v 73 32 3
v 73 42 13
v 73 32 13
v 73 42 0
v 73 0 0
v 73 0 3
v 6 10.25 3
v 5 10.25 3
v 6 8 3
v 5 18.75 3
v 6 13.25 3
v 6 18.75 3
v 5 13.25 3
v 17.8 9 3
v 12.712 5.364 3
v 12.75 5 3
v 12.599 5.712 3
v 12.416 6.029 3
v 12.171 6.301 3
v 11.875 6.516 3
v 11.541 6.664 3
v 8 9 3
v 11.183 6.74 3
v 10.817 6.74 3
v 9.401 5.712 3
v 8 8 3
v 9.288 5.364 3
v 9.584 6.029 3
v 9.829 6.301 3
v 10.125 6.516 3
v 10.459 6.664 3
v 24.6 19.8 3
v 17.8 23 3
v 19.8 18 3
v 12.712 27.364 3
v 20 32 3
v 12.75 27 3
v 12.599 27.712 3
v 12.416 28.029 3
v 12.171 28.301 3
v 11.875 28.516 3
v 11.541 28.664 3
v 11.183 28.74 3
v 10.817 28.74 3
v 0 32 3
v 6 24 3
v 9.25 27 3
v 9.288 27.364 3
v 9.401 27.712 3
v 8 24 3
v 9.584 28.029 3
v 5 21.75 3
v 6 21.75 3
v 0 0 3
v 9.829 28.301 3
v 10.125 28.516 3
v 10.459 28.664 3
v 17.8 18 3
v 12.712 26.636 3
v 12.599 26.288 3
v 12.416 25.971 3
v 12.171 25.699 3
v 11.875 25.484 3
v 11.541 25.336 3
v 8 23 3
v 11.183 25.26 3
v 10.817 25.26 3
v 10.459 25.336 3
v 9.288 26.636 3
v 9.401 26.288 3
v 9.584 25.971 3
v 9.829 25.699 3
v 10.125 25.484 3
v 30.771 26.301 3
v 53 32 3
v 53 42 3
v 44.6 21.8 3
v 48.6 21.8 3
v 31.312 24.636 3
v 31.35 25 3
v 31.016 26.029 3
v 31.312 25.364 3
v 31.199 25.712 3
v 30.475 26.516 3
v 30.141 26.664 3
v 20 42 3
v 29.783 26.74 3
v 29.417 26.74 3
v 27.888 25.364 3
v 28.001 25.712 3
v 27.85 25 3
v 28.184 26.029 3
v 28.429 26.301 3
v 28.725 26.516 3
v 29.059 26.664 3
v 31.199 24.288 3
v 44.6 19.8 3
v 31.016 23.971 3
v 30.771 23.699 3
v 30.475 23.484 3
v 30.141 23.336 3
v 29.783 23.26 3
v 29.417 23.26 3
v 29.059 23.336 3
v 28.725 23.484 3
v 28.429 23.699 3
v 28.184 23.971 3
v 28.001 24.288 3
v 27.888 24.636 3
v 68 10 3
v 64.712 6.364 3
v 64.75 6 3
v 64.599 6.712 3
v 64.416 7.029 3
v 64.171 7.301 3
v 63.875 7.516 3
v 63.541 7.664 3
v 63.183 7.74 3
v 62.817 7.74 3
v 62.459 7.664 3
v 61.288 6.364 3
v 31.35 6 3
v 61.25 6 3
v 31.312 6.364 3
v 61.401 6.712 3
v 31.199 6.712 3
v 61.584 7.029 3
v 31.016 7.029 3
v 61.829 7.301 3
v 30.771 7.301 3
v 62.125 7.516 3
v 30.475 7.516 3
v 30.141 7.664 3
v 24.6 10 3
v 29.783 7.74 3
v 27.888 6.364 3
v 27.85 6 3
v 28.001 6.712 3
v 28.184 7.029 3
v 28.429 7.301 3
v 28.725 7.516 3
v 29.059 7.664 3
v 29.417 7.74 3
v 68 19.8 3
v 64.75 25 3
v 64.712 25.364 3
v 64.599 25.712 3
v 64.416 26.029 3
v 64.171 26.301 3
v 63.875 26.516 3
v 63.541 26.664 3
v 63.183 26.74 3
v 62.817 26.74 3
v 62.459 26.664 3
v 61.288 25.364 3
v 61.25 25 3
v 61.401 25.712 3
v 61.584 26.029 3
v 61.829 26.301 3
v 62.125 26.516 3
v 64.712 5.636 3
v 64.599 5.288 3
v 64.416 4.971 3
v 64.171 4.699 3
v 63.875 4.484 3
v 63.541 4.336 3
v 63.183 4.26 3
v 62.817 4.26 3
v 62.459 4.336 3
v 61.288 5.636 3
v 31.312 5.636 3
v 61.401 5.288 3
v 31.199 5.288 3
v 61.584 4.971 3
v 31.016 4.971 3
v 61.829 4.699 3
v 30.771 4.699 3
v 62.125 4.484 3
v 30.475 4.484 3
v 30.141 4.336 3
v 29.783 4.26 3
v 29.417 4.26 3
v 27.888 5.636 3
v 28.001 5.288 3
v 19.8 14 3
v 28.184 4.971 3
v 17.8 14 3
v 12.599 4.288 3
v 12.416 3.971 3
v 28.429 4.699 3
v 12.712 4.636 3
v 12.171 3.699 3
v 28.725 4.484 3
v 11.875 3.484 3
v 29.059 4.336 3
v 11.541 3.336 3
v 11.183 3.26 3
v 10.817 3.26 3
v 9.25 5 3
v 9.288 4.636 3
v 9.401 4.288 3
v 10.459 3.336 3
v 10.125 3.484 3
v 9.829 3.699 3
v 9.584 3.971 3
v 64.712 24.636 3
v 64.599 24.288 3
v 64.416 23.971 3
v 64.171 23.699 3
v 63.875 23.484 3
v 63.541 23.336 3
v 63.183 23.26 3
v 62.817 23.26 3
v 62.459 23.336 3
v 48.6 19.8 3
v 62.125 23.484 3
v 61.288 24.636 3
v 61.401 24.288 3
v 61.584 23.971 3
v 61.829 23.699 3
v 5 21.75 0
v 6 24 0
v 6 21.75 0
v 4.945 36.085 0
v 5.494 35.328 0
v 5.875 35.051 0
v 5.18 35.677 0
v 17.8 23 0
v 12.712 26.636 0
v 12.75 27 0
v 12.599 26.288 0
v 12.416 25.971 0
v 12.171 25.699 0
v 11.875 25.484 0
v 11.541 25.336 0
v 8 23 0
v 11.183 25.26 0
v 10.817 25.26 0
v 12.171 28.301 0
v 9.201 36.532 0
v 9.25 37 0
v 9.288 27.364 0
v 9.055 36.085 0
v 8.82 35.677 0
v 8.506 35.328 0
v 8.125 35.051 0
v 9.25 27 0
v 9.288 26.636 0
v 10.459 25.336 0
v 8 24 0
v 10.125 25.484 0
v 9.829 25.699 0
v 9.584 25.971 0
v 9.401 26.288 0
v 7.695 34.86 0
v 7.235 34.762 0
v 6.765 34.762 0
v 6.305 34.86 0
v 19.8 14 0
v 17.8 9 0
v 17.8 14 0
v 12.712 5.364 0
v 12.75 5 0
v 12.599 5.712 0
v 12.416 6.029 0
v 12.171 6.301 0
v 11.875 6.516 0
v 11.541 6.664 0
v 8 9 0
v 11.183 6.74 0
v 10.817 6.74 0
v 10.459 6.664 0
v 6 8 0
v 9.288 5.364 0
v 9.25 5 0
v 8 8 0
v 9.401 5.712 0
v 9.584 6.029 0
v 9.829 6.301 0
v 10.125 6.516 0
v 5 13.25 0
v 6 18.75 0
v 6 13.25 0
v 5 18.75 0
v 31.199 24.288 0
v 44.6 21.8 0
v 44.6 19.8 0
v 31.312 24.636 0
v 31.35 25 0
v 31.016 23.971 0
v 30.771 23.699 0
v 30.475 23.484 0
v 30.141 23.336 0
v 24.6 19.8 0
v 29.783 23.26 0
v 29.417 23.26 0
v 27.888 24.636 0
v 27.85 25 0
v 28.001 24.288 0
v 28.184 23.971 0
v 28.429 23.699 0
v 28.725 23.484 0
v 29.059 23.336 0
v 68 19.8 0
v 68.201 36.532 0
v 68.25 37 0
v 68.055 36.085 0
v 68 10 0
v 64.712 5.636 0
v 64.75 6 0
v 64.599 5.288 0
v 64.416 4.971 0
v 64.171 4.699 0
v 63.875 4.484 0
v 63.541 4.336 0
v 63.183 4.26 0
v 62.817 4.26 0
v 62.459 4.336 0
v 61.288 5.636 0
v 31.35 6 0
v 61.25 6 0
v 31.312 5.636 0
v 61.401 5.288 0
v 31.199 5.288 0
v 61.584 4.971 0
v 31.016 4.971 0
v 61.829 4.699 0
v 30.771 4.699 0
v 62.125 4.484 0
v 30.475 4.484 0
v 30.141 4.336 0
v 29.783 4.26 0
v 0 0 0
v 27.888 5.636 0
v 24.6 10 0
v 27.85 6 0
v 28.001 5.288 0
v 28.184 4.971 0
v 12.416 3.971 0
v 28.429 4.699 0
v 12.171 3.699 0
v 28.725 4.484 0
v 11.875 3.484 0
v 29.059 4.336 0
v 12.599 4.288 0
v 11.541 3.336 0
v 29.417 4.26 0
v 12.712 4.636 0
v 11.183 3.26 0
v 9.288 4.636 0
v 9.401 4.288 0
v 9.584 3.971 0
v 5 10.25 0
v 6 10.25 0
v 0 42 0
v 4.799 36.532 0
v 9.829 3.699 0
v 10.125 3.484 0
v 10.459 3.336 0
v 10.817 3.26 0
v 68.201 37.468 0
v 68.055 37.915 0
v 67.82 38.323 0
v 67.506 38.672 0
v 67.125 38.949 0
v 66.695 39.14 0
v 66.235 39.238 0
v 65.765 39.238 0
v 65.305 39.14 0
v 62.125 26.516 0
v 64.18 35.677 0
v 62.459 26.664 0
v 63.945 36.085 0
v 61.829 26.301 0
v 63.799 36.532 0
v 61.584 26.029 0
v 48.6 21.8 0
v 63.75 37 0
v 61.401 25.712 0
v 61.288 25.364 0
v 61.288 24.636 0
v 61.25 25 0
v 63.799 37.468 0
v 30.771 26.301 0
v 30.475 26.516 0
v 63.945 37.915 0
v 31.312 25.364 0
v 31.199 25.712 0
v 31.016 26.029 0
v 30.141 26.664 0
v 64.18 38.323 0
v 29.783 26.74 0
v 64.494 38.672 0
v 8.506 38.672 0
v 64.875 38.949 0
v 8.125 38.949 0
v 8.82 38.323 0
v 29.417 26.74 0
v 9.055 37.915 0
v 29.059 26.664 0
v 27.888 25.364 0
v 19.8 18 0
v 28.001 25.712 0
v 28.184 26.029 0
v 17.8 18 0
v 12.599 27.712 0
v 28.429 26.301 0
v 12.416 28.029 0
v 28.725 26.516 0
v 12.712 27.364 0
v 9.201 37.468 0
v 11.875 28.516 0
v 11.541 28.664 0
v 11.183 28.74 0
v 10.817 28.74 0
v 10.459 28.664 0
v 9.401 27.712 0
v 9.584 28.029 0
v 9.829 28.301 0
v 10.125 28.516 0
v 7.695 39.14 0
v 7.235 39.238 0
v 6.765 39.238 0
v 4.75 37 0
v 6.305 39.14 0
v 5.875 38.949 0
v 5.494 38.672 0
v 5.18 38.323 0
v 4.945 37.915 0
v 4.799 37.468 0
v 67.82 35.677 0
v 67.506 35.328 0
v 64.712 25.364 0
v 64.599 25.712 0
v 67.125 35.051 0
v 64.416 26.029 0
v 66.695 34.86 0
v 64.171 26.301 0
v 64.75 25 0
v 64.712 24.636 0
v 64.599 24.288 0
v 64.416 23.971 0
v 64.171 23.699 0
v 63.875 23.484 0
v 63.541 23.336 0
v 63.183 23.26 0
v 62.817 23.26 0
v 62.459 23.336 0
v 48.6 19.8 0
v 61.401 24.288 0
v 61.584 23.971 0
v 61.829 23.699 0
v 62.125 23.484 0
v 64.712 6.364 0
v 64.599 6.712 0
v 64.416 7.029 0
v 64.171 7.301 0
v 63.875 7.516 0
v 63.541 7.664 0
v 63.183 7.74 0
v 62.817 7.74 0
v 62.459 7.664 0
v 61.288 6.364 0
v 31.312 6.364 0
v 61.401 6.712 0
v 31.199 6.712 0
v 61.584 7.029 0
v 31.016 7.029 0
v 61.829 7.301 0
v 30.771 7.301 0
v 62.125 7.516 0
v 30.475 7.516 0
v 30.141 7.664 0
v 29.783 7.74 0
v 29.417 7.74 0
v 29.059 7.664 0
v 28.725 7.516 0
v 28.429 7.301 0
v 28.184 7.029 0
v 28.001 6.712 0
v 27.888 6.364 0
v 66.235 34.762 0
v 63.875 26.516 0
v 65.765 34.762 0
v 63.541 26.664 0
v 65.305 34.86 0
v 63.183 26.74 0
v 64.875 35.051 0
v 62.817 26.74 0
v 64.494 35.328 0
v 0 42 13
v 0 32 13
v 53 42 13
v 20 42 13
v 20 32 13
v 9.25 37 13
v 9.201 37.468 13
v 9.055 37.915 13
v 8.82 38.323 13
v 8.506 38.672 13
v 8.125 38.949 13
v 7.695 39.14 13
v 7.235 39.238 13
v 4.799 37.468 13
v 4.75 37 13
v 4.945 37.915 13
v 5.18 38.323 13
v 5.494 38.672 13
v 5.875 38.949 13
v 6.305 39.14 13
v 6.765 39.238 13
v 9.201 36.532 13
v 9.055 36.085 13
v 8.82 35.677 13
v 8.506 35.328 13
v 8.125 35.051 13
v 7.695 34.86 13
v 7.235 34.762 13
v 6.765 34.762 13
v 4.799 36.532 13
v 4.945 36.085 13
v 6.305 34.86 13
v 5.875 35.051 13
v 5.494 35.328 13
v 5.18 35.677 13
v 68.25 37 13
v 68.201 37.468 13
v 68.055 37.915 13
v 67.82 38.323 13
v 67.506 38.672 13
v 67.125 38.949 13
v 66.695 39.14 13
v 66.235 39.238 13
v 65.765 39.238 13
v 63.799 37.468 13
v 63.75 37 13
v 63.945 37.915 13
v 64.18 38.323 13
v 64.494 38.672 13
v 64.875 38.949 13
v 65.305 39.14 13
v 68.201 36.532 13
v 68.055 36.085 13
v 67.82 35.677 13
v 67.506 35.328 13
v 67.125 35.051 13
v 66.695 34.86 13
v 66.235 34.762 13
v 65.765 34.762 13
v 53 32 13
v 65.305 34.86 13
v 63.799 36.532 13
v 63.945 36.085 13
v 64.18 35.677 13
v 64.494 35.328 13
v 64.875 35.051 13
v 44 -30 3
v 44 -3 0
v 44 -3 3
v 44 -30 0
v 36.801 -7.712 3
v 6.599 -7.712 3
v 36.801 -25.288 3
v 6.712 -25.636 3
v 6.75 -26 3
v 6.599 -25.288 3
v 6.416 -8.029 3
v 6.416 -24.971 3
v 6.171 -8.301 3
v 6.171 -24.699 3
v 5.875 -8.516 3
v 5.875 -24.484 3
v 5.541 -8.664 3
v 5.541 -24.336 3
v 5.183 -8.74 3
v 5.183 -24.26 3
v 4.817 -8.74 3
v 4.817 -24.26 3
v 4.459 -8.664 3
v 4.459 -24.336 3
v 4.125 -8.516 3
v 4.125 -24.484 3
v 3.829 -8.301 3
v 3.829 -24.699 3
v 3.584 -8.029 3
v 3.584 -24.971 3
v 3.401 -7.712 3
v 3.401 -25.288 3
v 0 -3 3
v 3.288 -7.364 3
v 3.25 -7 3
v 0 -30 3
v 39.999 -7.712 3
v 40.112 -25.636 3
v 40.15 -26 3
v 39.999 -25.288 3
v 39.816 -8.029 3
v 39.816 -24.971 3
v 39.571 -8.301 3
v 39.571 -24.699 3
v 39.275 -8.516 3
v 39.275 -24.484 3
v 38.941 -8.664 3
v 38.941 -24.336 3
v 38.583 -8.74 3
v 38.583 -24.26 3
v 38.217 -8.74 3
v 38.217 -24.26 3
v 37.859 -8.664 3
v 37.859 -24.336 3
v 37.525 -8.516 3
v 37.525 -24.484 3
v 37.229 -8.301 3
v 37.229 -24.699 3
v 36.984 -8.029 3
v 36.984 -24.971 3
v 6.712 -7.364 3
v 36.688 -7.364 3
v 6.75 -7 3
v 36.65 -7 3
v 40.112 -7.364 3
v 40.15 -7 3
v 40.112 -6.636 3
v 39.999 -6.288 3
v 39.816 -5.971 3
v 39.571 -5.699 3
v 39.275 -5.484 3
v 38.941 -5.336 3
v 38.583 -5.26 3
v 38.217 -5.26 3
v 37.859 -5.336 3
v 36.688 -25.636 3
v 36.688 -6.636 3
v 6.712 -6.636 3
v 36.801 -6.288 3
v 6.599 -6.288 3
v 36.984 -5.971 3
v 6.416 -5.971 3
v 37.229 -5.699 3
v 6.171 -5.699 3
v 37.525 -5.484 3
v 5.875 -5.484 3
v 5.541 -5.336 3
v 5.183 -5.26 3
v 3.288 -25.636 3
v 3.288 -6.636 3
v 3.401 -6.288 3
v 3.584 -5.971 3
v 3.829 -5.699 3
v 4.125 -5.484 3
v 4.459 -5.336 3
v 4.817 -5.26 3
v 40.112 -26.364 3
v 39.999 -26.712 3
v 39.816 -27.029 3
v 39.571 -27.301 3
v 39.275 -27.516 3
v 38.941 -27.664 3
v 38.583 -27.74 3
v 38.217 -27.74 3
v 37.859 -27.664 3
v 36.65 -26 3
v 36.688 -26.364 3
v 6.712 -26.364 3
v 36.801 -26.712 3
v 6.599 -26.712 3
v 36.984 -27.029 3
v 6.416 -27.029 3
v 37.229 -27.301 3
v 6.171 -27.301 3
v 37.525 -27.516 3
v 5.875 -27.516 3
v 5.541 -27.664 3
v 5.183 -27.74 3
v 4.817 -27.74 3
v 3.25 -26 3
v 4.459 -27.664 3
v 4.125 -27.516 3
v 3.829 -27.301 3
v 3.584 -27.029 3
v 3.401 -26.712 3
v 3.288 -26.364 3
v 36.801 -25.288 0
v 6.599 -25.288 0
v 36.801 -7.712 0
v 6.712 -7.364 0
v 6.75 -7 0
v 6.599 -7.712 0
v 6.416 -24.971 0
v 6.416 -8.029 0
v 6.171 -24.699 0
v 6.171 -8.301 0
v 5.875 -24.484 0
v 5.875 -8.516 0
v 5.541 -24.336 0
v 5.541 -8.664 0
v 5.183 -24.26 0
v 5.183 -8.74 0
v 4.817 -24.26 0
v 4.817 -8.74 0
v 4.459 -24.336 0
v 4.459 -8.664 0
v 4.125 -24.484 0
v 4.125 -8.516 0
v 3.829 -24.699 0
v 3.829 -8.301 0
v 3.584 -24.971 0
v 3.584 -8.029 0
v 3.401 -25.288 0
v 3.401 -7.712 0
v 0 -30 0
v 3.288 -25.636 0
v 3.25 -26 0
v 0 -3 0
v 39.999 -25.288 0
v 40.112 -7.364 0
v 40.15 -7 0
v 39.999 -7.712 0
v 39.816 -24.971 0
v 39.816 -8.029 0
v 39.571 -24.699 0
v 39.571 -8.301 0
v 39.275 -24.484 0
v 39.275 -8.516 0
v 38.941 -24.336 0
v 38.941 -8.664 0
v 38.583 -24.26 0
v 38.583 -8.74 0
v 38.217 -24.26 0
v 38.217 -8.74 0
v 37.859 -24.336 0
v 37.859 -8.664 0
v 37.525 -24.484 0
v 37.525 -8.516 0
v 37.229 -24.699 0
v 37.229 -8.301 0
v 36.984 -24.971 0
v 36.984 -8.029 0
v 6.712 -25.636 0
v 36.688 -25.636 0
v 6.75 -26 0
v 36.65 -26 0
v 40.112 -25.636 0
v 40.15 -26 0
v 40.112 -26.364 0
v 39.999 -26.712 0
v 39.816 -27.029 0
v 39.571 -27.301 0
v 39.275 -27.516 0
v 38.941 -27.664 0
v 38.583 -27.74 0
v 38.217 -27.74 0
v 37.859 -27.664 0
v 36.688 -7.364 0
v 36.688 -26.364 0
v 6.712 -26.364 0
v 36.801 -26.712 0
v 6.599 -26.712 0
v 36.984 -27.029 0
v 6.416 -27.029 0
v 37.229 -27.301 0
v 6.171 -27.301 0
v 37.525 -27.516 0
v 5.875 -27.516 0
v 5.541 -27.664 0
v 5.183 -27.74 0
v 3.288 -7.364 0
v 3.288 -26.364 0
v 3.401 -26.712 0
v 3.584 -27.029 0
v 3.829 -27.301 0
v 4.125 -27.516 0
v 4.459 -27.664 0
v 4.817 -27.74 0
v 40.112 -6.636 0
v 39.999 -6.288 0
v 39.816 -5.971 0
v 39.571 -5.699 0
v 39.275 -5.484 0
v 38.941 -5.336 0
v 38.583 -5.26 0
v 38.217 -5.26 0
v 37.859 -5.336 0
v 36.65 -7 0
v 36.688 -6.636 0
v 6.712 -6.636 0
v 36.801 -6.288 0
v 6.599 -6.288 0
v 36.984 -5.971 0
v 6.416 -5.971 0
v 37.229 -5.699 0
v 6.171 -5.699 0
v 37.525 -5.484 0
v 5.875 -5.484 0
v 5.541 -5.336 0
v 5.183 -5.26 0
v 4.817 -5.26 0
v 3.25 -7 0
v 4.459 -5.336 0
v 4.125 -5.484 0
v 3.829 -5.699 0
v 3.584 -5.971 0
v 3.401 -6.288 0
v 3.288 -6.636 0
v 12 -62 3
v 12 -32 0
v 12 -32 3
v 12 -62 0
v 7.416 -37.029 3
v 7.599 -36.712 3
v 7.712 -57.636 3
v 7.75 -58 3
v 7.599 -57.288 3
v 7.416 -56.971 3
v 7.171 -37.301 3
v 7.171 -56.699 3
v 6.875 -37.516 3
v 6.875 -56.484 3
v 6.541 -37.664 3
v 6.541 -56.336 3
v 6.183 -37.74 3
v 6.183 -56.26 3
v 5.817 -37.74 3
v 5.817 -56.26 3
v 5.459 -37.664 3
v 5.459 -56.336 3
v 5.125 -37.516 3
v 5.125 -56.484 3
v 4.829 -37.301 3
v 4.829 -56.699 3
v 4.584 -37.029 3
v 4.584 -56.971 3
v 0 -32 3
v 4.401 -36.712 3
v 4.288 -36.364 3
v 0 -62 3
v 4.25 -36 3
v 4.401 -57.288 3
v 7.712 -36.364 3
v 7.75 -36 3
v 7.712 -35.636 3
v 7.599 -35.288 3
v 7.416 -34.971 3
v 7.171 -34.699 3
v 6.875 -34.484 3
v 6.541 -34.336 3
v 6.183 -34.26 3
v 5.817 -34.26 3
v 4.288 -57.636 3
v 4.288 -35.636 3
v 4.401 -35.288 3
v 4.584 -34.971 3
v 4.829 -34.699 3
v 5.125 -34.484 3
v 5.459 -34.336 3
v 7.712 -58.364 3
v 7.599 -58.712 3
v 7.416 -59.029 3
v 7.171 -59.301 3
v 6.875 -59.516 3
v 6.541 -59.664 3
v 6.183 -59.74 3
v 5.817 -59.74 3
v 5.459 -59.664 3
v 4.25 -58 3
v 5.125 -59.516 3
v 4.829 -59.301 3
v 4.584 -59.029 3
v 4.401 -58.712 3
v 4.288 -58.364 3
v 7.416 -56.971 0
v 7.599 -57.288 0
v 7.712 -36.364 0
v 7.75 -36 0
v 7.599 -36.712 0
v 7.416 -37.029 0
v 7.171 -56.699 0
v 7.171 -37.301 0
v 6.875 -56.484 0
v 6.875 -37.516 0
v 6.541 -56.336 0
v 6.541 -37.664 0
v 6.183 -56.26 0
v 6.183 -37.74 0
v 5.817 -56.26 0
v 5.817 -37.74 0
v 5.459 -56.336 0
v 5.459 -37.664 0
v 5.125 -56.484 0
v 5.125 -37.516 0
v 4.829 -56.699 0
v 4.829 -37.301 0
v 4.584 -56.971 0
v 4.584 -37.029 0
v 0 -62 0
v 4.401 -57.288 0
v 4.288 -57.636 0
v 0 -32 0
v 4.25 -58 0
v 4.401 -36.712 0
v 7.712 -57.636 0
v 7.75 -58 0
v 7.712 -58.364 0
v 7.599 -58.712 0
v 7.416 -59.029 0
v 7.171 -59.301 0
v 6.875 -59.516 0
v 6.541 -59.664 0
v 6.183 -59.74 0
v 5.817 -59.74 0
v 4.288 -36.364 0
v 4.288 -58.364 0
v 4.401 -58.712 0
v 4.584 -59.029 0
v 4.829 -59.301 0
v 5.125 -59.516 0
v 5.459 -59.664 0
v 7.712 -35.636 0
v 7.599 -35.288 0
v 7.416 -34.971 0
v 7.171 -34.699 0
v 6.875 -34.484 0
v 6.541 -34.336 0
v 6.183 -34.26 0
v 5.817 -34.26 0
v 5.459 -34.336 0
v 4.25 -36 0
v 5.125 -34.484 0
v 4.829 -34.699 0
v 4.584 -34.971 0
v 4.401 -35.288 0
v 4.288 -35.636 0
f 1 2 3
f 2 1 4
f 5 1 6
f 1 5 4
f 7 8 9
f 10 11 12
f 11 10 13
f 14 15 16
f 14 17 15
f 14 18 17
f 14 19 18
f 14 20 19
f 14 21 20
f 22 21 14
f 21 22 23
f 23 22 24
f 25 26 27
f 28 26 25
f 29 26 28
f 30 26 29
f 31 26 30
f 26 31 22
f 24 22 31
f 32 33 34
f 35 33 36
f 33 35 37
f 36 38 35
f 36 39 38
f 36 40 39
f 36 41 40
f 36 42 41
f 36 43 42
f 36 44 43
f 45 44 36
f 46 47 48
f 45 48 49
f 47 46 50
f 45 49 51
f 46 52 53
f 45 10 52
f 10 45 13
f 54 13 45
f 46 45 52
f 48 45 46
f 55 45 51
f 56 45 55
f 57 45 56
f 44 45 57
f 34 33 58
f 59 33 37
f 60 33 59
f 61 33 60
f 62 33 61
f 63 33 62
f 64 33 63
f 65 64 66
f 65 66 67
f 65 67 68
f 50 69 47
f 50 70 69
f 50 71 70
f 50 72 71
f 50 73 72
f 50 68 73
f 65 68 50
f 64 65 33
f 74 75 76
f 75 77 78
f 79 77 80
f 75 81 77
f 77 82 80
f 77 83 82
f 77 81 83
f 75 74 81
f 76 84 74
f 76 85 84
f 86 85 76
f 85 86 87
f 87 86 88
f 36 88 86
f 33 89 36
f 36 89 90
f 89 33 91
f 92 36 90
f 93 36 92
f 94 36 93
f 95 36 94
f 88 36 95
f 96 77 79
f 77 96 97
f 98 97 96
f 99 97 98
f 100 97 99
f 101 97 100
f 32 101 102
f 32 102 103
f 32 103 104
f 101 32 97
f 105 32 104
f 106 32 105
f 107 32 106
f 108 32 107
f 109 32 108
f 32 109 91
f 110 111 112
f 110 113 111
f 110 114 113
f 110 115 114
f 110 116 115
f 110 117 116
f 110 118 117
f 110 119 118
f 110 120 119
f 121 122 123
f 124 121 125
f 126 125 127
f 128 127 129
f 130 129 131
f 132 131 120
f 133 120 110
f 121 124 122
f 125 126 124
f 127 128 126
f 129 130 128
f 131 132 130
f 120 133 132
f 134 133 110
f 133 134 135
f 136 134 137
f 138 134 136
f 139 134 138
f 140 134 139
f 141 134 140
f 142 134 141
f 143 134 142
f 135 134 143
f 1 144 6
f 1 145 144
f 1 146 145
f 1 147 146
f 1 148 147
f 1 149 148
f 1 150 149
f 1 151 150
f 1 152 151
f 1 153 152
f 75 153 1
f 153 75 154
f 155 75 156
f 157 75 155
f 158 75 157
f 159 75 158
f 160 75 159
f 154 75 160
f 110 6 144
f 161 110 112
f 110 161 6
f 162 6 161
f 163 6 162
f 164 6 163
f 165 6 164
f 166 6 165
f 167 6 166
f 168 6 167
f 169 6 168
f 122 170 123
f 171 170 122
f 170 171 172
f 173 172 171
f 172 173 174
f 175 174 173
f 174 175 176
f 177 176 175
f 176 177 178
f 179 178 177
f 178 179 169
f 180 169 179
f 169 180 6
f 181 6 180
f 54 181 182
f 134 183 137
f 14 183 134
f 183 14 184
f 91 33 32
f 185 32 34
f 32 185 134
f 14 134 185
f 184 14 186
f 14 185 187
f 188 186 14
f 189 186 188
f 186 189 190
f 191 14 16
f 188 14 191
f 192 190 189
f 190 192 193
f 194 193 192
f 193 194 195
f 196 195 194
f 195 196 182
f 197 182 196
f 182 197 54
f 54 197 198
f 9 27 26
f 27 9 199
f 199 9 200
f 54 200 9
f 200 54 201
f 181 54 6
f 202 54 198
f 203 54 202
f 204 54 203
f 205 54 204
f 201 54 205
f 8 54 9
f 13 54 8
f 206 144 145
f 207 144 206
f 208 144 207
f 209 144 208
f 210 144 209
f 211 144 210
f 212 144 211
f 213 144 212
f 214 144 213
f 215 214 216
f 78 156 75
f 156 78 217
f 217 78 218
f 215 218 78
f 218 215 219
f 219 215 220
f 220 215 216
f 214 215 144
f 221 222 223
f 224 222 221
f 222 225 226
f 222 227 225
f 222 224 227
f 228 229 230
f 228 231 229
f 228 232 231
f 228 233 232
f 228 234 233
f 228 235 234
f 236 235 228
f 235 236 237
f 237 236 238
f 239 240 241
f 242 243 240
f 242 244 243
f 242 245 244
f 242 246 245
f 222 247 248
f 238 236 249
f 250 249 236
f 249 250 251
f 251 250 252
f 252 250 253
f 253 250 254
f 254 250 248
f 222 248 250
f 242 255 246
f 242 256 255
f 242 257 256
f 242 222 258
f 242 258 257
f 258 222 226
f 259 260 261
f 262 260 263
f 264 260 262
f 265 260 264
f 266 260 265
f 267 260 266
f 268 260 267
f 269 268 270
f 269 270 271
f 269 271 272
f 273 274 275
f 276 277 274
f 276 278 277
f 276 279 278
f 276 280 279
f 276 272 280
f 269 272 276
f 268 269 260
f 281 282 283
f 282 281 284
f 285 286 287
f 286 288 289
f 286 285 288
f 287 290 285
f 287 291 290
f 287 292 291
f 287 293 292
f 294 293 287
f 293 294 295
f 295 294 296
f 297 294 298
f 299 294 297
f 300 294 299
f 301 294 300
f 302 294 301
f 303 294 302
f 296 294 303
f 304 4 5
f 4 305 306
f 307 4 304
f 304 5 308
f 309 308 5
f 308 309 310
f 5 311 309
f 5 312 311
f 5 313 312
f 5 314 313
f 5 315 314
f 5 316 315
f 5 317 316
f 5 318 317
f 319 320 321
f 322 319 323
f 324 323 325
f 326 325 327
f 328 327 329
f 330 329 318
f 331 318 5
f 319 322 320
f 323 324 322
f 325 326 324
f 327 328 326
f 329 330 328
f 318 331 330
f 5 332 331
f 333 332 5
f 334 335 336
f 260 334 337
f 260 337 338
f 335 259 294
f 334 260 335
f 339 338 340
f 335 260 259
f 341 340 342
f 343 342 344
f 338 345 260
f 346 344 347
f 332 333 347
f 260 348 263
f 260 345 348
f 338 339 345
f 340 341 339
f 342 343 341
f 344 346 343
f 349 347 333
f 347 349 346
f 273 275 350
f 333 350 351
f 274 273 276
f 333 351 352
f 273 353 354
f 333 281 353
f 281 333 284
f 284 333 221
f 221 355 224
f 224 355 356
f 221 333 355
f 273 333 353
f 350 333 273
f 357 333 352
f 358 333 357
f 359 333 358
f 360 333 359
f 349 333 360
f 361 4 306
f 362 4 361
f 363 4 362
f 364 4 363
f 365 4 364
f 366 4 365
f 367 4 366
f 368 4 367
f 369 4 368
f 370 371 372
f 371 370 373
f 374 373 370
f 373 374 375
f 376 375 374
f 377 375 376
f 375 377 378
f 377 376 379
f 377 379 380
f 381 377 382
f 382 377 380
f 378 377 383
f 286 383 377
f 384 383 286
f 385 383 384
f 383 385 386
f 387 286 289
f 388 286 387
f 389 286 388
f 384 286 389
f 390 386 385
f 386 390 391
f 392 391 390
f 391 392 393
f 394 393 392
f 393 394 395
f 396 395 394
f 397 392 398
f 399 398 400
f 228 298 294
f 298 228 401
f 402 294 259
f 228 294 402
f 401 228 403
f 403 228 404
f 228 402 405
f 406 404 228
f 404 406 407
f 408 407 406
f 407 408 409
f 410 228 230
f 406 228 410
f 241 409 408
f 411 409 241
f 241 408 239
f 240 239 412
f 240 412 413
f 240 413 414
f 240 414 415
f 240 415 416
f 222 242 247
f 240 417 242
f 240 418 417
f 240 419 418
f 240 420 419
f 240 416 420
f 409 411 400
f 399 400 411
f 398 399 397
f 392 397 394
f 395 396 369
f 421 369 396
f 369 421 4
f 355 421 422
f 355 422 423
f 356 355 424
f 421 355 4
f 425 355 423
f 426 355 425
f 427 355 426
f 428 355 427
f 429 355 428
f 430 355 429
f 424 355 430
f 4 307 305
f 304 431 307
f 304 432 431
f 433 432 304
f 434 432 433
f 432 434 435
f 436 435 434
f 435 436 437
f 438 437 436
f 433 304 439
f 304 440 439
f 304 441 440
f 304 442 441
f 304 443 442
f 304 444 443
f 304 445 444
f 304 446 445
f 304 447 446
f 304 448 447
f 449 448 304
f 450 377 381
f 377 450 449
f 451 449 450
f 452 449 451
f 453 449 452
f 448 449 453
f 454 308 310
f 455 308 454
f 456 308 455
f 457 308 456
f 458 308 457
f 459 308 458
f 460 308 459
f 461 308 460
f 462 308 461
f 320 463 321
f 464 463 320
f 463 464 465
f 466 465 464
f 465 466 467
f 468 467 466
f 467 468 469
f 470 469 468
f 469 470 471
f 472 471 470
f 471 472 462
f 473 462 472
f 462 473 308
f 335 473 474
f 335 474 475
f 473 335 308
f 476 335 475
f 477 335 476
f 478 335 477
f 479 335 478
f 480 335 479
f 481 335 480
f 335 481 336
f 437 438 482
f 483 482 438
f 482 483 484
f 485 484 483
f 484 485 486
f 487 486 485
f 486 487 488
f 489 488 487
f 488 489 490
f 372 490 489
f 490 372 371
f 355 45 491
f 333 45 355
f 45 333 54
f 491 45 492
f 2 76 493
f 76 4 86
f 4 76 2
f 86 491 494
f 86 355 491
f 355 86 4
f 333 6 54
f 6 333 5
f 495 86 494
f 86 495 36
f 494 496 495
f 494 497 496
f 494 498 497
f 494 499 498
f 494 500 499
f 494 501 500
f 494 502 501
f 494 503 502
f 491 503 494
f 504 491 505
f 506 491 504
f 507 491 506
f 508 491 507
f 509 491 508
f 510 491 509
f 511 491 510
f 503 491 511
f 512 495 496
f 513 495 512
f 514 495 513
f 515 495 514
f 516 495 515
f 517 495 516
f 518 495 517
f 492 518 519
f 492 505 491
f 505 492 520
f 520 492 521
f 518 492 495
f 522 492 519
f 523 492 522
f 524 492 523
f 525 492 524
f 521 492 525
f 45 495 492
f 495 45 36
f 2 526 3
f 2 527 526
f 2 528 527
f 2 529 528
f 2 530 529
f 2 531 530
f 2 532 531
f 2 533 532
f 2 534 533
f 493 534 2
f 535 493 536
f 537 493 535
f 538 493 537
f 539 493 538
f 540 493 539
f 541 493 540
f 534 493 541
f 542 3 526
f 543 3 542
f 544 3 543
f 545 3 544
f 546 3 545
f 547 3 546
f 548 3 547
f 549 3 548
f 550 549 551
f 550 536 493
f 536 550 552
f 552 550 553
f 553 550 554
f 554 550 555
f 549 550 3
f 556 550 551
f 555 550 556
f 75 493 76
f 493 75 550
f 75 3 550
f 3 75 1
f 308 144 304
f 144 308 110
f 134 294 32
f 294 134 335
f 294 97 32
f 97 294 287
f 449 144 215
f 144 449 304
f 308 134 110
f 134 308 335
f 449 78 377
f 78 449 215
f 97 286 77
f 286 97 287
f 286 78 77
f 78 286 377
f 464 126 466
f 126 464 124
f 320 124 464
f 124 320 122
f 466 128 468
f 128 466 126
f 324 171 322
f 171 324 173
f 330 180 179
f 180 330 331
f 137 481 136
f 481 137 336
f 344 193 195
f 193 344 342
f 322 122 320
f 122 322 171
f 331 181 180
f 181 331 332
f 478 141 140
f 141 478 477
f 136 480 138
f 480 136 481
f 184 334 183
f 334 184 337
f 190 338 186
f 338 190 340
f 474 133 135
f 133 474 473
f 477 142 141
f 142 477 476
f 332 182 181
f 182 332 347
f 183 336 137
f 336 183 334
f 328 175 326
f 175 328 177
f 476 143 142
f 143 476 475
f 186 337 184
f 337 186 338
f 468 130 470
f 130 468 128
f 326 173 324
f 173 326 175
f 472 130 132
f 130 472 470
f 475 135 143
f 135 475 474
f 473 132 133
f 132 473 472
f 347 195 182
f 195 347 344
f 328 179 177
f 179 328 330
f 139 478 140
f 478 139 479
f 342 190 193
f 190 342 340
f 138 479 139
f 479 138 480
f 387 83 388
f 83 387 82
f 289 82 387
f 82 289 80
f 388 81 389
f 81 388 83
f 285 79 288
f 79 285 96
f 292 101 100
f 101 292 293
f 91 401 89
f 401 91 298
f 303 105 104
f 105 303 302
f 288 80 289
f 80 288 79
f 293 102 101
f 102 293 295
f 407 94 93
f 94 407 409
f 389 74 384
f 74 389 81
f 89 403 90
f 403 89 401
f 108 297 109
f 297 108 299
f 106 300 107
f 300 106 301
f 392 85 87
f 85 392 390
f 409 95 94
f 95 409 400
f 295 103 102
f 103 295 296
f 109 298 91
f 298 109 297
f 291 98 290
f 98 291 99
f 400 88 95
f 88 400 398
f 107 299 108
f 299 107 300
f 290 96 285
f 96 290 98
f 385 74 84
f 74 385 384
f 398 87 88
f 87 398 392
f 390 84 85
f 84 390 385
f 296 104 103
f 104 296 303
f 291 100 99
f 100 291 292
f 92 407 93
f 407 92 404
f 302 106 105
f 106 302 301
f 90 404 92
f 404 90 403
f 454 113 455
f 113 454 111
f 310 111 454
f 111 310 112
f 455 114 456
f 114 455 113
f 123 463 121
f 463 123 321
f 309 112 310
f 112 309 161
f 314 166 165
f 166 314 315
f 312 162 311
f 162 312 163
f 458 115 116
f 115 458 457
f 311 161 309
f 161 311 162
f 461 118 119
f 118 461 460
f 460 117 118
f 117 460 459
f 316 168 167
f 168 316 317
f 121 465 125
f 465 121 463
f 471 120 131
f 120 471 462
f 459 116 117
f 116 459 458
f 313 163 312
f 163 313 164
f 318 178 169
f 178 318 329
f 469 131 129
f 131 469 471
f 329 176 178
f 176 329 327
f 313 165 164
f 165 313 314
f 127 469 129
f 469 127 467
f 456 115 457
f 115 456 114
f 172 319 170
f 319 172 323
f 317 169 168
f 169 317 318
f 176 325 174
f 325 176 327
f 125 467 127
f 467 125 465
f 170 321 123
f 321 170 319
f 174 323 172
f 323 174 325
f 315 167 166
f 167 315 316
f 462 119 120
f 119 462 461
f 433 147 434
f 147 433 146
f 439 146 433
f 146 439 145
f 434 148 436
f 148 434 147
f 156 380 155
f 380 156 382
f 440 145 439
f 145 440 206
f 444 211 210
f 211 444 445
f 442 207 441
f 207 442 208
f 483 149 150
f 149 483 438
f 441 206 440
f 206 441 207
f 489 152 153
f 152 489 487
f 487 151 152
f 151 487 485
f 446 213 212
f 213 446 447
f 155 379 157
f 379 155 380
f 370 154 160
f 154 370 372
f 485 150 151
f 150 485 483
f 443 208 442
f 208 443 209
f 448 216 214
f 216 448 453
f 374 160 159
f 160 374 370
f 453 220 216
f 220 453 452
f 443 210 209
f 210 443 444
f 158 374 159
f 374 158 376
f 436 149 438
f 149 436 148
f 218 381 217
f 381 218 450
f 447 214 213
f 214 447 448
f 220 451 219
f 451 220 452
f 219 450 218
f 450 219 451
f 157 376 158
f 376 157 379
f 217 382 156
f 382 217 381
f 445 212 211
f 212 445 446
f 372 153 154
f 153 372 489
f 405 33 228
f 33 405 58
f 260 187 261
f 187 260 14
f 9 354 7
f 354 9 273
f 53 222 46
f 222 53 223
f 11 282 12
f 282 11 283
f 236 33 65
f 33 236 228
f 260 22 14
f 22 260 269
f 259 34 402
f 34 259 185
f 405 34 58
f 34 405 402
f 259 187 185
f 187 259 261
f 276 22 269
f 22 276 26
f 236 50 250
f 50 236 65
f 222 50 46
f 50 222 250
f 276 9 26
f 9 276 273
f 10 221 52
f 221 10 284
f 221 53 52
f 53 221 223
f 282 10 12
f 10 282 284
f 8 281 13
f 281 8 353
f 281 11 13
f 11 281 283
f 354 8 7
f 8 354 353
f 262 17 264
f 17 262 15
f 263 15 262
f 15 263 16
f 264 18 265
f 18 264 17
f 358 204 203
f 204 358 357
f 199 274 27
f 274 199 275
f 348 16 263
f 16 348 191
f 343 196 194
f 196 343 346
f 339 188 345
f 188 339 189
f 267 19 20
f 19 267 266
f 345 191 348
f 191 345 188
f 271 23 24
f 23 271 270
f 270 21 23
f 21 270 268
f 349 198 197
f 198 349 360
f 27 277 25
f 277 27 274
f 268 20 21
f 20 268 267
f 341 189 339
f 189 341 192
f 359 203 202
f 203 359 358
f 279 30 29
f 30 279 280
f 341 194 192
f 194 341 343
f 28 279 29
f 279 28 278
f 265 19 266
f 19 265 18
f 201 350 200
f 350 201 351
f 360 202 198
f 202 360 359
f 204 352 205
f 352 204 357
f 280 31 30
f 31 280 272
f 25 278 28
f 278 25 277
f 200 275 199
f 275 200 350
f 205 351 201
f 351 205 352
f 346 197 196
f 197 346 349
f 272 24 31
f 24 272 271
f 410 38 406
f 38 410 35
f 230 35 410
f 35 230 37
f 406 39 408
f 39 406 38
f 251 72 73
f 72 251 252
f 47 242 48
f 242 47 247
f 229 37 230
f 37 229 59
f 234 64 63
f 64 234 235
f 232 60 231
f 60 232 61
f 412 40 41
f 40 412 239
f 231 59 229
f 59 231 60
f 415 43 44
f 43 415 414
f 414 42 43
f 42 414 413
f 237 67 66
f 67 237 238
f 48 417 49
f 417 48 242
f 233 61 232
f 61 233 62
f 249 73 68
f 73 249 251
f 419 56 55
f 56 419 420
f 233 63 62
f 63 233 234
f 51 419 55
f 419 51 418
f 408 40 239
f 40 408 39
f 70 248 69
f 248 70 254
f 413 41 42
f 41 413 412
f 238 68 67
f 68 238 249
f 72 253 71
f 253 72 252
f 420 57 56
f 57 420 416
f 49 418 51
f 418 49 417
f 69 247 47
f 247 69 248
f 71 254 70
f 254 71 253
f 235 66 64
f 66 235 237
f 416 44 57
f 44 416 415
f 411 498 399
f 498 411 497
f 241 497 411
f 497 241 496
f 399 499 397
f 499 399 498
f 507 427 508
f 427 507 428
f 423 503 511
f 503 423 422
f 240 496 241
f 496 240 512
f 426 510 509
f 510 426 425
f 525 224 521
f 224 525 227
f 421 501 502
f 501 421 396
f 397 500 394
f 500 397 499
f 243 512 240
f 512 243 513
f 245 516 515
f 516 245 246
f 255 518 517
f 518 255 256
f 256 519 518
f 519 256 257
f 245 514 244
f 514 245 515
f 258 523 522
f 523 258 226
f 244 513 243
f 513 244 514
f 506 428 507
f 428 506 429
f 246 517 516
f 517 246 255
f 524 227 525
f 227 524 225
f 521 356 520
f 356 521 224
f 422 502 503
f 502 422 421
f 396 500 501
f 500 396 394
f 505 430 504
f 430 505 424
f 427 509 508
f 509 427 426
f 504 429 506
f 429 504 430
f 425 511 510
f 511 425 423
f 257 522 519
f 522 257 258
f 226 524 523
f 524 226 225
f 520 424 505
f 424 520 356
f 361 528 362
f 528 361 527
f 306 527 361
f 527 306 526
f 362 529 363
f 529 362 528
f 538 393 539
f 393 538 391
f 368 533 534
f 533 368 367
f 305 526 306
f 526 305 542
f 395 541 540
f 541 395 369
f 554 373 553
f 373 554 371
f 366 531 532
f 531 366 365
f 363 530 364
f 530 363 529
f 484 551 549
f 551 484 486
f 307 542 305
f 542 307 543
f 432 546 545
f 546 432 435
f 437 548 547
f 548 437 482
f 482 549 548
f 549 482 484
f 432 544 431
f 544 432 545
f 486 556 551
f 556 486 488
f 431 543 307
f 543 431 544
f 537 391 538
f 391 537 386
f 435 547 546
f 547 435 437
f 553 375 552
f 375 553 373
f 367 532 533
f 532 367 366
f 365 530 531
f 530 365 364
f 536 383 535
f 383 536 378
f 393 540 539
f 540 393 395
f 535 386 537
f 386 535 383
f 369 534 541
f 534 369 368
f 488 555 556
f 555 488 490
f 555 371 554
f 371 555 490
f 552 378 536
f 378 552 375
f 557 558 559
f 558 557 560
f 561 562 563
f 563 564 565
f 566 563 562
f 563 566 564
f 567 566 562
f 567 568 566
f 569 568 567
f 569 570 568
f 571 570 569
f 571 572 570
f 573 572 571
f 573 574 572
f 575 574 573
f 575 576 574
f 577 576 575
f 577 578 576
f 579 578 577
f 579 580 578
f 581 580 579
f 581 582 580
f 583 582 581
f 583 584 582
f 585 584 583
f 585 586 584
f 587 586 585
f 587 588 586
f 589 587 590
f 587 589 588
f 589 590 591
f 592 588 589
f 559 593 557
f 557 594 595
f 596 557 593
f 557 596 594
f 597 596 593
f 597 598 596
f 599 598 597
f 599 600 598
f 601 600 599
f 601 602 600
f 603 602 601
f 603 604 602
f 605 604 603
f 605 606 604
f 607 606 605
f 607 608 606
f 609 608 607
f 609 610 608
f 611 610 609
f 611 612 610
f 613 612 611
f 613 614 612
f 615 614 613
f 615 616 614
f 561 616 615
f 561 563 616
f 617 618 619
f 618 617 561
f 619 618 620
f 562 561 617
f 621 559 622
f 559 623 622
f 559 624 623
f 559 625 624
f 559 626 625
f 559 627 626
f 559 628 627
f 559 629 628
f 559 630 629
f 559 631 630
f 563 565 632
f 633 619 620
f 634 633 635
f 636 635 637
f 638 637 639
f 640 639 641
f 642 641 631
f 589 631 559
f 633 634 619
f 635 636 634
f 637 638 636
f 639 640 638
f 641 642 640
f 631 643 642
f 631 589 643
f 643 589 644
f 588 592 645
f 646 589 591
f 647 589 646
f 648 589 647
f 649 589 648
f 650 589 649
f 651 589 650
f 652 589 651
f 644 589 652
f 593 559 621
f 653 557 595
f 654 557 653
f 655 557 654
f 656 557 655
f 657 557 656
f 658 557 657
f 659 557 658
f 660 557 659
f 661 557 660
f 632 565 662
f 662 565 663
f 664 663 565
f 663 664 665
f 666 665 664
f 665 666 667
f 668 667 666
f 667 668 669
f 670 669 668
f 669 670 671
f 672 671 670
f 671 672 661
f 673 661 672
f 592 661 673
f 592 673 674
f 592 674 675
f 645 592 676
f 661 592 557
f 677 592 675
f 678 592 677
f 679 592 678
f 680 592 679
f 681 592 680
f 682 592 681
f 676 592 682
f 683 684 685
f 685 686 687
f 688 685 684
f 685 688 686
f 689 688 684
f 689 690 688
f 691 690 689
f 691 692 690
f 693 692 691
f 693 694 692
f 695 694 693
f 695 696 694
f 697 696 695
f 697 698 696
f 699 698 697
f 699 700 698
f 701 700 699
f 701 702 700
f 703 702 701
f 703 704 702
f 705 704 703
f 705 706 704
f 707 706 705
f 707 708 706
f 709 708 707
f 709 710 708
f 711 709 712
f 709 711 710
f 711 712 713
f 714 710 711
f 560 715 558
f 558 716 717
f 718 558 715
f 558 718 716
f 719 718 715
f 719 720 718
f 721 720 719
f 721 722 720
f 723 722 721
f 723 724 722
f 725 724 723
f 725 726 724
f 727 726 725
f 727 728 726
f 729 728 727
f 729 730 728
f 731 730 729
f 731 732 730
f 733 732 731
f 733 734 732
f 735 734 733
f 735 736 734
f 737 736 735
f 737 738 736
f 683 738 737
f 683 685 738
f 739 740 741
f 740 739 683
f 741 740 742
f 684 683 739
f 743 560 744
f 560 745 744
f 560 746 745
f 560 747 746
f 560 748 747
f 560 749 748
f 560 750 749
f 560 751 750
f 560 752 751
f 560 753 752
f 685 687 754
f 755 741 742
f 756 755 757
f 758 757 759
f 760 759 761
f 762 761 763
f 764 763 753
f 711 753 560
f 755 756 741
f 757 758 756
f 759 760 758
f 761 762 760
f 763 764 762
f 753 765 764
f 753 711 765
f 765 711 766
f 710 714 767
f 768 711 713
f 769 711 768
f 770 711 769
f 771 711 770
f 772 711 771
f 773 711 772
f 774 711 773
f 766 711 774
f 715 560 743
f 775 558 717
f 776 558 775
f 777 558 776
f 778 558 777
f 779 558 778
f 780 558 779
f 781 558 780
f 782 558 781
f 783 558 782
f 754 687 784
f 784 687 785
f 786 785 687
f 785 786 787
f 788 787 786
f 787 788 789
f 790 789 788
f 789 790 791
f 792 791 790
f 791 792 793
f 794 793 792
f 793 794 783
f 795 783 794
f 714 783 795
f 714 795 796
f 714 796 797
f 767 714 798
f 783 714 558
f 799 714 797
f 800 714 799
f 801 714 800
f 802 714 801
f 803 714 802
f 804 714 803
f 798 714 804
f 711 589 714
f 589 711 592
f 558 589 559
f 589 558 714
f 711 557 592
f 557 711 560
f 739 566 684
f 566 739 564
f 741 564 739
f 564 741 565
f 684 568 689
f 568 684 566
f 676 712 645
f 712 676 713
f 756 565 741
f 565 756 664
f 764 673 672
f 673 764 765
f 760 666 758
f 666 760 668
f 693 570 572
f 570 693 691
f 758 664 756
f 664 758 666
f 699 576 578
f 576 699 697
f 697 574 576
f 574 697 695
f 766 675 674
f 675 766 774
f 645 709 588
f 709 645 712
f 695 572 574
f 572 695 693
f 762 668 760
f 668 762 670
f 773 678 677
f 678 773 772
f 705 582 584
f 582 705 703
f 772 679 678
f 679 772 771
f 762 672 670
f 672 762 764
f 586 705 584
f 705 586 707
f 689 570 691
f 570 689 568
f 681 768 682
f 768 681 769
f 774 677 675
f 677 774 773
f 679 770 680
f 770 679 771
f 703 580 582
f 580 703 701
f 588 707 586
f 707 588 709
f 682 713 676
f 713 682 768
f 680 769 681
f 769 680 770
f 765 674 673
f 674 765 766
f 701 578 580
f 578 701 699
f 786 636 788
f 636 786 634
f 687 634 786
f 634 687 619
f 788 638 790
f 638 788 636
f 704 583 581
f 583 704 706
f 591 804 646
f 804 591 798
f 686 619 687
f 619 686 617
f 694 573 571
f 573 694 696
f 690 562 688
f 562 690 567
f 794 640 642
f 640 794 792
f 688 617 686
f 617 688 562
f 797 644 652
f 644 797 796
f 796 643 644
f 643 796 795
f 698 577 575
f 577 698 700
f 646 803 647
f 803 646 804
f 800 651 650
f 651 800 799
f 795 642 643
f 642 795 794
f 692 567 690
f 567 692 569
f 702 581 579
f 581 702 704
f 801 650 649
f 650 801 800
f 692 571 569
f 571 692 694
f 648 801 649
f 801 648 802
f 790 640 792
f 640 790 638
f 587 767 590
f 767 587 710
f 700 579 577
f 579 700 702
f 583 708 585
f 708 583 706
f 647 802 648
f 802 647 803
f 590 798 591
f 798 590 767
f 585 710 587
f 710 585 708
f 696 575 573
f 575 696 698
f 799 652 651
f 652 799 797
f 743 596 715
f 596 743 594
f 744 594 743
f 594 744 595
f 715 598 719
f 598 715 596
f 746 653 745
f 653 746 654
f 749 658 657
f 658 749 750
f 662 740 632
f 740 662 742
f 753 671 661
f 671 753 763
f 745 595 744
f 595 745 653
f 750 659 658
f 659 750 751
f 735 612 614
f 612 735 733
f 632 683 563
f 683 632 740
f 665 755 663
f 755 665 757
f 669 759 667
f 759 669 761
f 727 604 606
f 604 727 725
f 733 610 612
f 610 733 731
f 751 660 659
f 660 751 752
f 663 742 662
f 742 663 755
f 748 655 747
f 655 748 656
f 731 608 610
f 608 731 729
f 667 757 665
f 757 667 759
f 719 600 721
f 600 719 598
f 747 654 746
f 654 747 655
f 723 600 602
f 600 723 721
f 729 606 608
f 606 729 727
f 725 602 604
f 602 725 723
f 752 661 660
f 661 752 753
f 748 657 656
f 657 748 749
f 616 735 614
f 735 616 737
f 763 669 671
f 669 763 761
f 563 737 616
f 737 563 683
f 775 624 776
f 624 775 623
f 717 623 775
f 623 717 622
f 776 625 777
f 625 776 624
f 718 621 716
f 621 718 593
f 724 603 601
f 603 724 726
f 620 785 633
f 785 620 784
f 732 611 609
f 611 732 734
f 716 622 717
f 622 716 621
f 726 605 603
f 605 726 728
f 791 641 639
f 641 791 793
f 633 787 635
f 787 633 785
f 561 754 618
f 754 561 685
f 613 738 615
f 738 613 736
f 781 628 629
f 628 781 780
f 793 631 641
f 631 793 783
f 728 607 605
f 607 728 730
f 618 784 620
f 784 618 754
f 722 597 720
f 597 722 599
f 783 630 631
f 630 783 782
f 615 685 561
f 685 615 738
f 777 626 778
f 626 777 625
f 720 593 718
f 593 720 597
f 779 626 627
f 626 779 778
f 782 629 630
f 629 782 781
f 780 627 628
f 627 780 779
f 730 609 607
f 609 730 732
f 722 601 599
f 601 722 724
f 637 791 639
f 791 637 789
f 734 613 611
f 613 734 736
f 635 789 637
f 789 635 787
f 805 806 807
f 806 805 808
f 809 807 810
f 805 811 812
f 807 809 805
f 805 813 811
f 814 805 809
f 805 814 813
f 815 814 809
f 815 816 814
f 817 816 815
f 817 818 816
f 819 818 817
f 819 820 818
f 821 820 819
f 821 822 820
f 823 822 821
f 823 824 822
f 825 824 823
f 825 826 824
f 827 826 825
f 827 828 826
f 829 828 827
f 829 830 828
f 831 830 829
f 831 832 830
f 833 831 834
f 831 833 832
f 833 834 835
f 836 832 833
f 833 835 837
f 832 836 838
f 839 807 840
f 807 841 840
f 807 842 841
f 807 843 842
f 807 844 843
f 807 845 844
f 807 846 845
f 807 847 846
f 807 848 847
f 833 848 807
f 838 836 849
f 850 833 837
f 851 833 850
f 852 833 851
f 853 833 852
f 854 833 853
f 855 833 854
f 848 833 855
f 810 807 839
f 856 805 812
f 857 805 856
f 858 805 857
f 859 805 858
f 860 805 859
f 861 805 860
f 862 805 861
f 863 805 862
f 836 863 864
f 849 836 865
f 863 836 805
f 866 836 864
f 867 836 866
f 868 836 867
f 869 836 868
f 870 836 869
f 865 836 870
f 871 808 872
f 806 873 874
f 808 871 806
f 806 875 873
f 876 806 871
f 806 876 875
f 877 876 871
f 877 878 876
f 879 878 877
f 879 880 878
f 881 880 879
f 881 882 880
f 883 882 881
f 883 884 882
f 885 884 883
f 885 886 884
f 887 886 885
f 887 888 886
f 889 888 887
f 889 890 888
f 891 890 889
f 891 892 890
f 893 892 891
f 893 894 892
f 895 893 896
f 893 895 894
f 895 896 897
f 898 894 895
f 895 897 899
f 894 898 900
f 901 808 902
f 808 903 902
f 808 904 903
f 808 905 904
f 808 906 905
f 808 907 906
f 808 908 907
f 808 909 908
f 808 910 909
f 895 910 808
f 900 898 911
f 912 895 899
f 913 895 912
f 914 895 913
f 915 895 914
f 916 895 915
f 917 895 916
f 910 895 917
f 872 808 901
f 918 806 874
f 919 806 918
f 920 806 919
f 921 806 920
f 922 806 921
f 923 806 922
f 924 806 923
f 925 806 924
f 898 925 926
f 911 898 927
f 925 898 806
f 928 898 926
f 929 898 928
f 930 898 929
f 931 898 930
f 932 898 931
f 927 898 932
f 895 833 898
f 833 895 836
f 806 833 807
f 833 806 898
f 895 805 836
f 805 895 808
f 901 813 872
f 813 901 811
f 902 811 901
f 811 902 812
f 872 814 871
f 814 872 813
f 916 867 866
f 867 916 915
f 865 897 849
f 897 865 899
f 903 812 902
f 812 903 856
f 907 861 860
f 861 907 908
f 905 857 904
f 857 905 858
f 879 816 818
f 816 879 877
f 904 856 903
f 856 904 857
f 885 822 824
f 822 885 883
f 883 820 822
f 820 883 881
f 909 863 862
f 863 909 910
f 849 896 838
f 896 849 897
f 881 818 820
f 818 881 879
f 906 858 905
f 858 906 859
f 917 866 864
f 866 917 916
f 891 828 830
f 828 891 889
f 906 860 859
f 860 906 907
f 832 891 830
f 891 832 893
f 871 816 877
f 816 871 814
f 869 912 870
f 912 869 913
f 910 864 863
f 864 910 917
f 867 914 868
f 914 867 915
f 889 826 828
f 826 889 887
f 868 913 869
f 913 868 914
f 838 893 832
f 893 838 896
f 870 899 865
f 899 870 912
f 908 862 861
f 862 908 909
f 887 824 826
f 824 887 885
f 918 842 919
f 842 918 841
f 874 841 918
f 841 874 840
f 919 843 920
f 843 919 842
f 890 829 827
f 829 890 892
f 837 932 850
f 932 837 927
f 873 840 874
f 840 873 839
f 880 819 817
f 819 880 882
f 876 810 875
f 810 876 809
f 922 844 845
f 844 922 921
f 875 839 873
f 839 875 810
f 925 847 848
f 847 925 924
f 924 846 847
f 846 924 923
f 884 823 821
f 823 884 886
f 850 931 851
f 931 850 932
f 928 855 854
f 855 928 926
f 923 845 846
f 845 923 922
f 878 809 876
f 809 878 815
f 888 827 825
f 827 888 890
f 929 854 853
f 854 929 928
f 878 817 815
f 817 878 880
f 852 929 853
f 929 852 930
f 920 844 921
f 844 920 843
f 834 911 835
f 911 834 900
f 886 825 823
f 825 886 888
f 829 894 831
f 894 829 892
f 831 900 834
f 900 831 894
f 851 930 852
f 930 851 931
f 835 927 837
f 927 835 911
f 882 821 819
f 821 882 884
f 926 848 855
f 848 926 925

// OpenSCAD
ATX_connector_offset = 24.6;
GPU_connector_offset = 5;

module plate() {
    cube([73, 42, 3]);
    translate([0,32,3]) cube([20, 10, 10]);
    translate([53,32,3]) cube([20, 10, 10]);
}

module back_plate_ATX() {
    difference() {
        cube([44, 27, 3]);
        translate([5, 4, -1]) cylinder(d=3.5, h=5, $fn=30);
        translate([5, 23, -1]) cylinder(d=3.5, h=5, $fn=30);

        translate([38.4, 4, -1]) cylinder(d=3.5, h=5, $fn=30);
        translate([38.4, 23, -1]) cylinder(d=3.5, h=5, $fn=30);
    }
}

module back_plate_GPU() {
    difference() {
        cube([12, 30, 3]);
        translate([6, 4, -1]) cylinder(d=3.5, h=5, $fn=30);
        translate([6, 26, -1]) cylinder(d=3.5, h=5, $fn=30);
    }
}

module plate_with_holes() {
    difference() {
    
        plate();
        
        // ATX
        translate([ATX_connector_offset,10,-1]) cube([43.4, 9.8, 5]);
        translate([ATX_connector_offset+20,19.8,-1]) cube([4, 2, 5]);

        translate([ATX_connector_offset+5, 6, -1]) cylinder(d=3.5, h=5, $fn=30);
        translate([ATX_connector_offset+5, 25, -1]) cylinder(d=3.5, h=5, $fn=30);

        translate([ATX_connector_offset+38.4, 6, -1]) cylinder(d=3.5, h=5, $fn=30);
        translate([ATX_connector_offset+38.4, 25, -1]) cylinder(d=3.5, h=5, $fn=30);

        // GPU
        translate([GPU_connector_offset+1,9,-1]) cube([11.8, 14, 5]);
        translate([GPU_connector_offset+12.8,14,-1]) cube([2, 4, 5]);
        translate([GPU_connector_offset+1,8,-1]) cube([2, 16, 5]);
        translate([GPU_connector_offset,18.75,-1]) cube([2, 3, 5]);
        translate([GPU_connector_offset,10.25,-1]) cube([2, 3, 5]);
        
        translate([GPU_connector_offset+6, 5, -1]) cylinder(d=3.5, h=5, $fn=30);
        translate([GPU_connector_offset+6, 27, -1]) cylinder(d=3.5, h=5, $fn=30);
        
        // mount holes
        translate([7, 37, -1]) cylinder(d=4.5, h=15, $fn=30);
        translate([66, 37, -1]) cylinder(d=4.5, h=15, $fn=30);
    }
}

module power_connectors() {
    plate_with_holes();
    translate([0,-30,0]) back_plate_ATX();
    translate([0,-62,0]) back_plate_GPU();
}

power_connectors();
